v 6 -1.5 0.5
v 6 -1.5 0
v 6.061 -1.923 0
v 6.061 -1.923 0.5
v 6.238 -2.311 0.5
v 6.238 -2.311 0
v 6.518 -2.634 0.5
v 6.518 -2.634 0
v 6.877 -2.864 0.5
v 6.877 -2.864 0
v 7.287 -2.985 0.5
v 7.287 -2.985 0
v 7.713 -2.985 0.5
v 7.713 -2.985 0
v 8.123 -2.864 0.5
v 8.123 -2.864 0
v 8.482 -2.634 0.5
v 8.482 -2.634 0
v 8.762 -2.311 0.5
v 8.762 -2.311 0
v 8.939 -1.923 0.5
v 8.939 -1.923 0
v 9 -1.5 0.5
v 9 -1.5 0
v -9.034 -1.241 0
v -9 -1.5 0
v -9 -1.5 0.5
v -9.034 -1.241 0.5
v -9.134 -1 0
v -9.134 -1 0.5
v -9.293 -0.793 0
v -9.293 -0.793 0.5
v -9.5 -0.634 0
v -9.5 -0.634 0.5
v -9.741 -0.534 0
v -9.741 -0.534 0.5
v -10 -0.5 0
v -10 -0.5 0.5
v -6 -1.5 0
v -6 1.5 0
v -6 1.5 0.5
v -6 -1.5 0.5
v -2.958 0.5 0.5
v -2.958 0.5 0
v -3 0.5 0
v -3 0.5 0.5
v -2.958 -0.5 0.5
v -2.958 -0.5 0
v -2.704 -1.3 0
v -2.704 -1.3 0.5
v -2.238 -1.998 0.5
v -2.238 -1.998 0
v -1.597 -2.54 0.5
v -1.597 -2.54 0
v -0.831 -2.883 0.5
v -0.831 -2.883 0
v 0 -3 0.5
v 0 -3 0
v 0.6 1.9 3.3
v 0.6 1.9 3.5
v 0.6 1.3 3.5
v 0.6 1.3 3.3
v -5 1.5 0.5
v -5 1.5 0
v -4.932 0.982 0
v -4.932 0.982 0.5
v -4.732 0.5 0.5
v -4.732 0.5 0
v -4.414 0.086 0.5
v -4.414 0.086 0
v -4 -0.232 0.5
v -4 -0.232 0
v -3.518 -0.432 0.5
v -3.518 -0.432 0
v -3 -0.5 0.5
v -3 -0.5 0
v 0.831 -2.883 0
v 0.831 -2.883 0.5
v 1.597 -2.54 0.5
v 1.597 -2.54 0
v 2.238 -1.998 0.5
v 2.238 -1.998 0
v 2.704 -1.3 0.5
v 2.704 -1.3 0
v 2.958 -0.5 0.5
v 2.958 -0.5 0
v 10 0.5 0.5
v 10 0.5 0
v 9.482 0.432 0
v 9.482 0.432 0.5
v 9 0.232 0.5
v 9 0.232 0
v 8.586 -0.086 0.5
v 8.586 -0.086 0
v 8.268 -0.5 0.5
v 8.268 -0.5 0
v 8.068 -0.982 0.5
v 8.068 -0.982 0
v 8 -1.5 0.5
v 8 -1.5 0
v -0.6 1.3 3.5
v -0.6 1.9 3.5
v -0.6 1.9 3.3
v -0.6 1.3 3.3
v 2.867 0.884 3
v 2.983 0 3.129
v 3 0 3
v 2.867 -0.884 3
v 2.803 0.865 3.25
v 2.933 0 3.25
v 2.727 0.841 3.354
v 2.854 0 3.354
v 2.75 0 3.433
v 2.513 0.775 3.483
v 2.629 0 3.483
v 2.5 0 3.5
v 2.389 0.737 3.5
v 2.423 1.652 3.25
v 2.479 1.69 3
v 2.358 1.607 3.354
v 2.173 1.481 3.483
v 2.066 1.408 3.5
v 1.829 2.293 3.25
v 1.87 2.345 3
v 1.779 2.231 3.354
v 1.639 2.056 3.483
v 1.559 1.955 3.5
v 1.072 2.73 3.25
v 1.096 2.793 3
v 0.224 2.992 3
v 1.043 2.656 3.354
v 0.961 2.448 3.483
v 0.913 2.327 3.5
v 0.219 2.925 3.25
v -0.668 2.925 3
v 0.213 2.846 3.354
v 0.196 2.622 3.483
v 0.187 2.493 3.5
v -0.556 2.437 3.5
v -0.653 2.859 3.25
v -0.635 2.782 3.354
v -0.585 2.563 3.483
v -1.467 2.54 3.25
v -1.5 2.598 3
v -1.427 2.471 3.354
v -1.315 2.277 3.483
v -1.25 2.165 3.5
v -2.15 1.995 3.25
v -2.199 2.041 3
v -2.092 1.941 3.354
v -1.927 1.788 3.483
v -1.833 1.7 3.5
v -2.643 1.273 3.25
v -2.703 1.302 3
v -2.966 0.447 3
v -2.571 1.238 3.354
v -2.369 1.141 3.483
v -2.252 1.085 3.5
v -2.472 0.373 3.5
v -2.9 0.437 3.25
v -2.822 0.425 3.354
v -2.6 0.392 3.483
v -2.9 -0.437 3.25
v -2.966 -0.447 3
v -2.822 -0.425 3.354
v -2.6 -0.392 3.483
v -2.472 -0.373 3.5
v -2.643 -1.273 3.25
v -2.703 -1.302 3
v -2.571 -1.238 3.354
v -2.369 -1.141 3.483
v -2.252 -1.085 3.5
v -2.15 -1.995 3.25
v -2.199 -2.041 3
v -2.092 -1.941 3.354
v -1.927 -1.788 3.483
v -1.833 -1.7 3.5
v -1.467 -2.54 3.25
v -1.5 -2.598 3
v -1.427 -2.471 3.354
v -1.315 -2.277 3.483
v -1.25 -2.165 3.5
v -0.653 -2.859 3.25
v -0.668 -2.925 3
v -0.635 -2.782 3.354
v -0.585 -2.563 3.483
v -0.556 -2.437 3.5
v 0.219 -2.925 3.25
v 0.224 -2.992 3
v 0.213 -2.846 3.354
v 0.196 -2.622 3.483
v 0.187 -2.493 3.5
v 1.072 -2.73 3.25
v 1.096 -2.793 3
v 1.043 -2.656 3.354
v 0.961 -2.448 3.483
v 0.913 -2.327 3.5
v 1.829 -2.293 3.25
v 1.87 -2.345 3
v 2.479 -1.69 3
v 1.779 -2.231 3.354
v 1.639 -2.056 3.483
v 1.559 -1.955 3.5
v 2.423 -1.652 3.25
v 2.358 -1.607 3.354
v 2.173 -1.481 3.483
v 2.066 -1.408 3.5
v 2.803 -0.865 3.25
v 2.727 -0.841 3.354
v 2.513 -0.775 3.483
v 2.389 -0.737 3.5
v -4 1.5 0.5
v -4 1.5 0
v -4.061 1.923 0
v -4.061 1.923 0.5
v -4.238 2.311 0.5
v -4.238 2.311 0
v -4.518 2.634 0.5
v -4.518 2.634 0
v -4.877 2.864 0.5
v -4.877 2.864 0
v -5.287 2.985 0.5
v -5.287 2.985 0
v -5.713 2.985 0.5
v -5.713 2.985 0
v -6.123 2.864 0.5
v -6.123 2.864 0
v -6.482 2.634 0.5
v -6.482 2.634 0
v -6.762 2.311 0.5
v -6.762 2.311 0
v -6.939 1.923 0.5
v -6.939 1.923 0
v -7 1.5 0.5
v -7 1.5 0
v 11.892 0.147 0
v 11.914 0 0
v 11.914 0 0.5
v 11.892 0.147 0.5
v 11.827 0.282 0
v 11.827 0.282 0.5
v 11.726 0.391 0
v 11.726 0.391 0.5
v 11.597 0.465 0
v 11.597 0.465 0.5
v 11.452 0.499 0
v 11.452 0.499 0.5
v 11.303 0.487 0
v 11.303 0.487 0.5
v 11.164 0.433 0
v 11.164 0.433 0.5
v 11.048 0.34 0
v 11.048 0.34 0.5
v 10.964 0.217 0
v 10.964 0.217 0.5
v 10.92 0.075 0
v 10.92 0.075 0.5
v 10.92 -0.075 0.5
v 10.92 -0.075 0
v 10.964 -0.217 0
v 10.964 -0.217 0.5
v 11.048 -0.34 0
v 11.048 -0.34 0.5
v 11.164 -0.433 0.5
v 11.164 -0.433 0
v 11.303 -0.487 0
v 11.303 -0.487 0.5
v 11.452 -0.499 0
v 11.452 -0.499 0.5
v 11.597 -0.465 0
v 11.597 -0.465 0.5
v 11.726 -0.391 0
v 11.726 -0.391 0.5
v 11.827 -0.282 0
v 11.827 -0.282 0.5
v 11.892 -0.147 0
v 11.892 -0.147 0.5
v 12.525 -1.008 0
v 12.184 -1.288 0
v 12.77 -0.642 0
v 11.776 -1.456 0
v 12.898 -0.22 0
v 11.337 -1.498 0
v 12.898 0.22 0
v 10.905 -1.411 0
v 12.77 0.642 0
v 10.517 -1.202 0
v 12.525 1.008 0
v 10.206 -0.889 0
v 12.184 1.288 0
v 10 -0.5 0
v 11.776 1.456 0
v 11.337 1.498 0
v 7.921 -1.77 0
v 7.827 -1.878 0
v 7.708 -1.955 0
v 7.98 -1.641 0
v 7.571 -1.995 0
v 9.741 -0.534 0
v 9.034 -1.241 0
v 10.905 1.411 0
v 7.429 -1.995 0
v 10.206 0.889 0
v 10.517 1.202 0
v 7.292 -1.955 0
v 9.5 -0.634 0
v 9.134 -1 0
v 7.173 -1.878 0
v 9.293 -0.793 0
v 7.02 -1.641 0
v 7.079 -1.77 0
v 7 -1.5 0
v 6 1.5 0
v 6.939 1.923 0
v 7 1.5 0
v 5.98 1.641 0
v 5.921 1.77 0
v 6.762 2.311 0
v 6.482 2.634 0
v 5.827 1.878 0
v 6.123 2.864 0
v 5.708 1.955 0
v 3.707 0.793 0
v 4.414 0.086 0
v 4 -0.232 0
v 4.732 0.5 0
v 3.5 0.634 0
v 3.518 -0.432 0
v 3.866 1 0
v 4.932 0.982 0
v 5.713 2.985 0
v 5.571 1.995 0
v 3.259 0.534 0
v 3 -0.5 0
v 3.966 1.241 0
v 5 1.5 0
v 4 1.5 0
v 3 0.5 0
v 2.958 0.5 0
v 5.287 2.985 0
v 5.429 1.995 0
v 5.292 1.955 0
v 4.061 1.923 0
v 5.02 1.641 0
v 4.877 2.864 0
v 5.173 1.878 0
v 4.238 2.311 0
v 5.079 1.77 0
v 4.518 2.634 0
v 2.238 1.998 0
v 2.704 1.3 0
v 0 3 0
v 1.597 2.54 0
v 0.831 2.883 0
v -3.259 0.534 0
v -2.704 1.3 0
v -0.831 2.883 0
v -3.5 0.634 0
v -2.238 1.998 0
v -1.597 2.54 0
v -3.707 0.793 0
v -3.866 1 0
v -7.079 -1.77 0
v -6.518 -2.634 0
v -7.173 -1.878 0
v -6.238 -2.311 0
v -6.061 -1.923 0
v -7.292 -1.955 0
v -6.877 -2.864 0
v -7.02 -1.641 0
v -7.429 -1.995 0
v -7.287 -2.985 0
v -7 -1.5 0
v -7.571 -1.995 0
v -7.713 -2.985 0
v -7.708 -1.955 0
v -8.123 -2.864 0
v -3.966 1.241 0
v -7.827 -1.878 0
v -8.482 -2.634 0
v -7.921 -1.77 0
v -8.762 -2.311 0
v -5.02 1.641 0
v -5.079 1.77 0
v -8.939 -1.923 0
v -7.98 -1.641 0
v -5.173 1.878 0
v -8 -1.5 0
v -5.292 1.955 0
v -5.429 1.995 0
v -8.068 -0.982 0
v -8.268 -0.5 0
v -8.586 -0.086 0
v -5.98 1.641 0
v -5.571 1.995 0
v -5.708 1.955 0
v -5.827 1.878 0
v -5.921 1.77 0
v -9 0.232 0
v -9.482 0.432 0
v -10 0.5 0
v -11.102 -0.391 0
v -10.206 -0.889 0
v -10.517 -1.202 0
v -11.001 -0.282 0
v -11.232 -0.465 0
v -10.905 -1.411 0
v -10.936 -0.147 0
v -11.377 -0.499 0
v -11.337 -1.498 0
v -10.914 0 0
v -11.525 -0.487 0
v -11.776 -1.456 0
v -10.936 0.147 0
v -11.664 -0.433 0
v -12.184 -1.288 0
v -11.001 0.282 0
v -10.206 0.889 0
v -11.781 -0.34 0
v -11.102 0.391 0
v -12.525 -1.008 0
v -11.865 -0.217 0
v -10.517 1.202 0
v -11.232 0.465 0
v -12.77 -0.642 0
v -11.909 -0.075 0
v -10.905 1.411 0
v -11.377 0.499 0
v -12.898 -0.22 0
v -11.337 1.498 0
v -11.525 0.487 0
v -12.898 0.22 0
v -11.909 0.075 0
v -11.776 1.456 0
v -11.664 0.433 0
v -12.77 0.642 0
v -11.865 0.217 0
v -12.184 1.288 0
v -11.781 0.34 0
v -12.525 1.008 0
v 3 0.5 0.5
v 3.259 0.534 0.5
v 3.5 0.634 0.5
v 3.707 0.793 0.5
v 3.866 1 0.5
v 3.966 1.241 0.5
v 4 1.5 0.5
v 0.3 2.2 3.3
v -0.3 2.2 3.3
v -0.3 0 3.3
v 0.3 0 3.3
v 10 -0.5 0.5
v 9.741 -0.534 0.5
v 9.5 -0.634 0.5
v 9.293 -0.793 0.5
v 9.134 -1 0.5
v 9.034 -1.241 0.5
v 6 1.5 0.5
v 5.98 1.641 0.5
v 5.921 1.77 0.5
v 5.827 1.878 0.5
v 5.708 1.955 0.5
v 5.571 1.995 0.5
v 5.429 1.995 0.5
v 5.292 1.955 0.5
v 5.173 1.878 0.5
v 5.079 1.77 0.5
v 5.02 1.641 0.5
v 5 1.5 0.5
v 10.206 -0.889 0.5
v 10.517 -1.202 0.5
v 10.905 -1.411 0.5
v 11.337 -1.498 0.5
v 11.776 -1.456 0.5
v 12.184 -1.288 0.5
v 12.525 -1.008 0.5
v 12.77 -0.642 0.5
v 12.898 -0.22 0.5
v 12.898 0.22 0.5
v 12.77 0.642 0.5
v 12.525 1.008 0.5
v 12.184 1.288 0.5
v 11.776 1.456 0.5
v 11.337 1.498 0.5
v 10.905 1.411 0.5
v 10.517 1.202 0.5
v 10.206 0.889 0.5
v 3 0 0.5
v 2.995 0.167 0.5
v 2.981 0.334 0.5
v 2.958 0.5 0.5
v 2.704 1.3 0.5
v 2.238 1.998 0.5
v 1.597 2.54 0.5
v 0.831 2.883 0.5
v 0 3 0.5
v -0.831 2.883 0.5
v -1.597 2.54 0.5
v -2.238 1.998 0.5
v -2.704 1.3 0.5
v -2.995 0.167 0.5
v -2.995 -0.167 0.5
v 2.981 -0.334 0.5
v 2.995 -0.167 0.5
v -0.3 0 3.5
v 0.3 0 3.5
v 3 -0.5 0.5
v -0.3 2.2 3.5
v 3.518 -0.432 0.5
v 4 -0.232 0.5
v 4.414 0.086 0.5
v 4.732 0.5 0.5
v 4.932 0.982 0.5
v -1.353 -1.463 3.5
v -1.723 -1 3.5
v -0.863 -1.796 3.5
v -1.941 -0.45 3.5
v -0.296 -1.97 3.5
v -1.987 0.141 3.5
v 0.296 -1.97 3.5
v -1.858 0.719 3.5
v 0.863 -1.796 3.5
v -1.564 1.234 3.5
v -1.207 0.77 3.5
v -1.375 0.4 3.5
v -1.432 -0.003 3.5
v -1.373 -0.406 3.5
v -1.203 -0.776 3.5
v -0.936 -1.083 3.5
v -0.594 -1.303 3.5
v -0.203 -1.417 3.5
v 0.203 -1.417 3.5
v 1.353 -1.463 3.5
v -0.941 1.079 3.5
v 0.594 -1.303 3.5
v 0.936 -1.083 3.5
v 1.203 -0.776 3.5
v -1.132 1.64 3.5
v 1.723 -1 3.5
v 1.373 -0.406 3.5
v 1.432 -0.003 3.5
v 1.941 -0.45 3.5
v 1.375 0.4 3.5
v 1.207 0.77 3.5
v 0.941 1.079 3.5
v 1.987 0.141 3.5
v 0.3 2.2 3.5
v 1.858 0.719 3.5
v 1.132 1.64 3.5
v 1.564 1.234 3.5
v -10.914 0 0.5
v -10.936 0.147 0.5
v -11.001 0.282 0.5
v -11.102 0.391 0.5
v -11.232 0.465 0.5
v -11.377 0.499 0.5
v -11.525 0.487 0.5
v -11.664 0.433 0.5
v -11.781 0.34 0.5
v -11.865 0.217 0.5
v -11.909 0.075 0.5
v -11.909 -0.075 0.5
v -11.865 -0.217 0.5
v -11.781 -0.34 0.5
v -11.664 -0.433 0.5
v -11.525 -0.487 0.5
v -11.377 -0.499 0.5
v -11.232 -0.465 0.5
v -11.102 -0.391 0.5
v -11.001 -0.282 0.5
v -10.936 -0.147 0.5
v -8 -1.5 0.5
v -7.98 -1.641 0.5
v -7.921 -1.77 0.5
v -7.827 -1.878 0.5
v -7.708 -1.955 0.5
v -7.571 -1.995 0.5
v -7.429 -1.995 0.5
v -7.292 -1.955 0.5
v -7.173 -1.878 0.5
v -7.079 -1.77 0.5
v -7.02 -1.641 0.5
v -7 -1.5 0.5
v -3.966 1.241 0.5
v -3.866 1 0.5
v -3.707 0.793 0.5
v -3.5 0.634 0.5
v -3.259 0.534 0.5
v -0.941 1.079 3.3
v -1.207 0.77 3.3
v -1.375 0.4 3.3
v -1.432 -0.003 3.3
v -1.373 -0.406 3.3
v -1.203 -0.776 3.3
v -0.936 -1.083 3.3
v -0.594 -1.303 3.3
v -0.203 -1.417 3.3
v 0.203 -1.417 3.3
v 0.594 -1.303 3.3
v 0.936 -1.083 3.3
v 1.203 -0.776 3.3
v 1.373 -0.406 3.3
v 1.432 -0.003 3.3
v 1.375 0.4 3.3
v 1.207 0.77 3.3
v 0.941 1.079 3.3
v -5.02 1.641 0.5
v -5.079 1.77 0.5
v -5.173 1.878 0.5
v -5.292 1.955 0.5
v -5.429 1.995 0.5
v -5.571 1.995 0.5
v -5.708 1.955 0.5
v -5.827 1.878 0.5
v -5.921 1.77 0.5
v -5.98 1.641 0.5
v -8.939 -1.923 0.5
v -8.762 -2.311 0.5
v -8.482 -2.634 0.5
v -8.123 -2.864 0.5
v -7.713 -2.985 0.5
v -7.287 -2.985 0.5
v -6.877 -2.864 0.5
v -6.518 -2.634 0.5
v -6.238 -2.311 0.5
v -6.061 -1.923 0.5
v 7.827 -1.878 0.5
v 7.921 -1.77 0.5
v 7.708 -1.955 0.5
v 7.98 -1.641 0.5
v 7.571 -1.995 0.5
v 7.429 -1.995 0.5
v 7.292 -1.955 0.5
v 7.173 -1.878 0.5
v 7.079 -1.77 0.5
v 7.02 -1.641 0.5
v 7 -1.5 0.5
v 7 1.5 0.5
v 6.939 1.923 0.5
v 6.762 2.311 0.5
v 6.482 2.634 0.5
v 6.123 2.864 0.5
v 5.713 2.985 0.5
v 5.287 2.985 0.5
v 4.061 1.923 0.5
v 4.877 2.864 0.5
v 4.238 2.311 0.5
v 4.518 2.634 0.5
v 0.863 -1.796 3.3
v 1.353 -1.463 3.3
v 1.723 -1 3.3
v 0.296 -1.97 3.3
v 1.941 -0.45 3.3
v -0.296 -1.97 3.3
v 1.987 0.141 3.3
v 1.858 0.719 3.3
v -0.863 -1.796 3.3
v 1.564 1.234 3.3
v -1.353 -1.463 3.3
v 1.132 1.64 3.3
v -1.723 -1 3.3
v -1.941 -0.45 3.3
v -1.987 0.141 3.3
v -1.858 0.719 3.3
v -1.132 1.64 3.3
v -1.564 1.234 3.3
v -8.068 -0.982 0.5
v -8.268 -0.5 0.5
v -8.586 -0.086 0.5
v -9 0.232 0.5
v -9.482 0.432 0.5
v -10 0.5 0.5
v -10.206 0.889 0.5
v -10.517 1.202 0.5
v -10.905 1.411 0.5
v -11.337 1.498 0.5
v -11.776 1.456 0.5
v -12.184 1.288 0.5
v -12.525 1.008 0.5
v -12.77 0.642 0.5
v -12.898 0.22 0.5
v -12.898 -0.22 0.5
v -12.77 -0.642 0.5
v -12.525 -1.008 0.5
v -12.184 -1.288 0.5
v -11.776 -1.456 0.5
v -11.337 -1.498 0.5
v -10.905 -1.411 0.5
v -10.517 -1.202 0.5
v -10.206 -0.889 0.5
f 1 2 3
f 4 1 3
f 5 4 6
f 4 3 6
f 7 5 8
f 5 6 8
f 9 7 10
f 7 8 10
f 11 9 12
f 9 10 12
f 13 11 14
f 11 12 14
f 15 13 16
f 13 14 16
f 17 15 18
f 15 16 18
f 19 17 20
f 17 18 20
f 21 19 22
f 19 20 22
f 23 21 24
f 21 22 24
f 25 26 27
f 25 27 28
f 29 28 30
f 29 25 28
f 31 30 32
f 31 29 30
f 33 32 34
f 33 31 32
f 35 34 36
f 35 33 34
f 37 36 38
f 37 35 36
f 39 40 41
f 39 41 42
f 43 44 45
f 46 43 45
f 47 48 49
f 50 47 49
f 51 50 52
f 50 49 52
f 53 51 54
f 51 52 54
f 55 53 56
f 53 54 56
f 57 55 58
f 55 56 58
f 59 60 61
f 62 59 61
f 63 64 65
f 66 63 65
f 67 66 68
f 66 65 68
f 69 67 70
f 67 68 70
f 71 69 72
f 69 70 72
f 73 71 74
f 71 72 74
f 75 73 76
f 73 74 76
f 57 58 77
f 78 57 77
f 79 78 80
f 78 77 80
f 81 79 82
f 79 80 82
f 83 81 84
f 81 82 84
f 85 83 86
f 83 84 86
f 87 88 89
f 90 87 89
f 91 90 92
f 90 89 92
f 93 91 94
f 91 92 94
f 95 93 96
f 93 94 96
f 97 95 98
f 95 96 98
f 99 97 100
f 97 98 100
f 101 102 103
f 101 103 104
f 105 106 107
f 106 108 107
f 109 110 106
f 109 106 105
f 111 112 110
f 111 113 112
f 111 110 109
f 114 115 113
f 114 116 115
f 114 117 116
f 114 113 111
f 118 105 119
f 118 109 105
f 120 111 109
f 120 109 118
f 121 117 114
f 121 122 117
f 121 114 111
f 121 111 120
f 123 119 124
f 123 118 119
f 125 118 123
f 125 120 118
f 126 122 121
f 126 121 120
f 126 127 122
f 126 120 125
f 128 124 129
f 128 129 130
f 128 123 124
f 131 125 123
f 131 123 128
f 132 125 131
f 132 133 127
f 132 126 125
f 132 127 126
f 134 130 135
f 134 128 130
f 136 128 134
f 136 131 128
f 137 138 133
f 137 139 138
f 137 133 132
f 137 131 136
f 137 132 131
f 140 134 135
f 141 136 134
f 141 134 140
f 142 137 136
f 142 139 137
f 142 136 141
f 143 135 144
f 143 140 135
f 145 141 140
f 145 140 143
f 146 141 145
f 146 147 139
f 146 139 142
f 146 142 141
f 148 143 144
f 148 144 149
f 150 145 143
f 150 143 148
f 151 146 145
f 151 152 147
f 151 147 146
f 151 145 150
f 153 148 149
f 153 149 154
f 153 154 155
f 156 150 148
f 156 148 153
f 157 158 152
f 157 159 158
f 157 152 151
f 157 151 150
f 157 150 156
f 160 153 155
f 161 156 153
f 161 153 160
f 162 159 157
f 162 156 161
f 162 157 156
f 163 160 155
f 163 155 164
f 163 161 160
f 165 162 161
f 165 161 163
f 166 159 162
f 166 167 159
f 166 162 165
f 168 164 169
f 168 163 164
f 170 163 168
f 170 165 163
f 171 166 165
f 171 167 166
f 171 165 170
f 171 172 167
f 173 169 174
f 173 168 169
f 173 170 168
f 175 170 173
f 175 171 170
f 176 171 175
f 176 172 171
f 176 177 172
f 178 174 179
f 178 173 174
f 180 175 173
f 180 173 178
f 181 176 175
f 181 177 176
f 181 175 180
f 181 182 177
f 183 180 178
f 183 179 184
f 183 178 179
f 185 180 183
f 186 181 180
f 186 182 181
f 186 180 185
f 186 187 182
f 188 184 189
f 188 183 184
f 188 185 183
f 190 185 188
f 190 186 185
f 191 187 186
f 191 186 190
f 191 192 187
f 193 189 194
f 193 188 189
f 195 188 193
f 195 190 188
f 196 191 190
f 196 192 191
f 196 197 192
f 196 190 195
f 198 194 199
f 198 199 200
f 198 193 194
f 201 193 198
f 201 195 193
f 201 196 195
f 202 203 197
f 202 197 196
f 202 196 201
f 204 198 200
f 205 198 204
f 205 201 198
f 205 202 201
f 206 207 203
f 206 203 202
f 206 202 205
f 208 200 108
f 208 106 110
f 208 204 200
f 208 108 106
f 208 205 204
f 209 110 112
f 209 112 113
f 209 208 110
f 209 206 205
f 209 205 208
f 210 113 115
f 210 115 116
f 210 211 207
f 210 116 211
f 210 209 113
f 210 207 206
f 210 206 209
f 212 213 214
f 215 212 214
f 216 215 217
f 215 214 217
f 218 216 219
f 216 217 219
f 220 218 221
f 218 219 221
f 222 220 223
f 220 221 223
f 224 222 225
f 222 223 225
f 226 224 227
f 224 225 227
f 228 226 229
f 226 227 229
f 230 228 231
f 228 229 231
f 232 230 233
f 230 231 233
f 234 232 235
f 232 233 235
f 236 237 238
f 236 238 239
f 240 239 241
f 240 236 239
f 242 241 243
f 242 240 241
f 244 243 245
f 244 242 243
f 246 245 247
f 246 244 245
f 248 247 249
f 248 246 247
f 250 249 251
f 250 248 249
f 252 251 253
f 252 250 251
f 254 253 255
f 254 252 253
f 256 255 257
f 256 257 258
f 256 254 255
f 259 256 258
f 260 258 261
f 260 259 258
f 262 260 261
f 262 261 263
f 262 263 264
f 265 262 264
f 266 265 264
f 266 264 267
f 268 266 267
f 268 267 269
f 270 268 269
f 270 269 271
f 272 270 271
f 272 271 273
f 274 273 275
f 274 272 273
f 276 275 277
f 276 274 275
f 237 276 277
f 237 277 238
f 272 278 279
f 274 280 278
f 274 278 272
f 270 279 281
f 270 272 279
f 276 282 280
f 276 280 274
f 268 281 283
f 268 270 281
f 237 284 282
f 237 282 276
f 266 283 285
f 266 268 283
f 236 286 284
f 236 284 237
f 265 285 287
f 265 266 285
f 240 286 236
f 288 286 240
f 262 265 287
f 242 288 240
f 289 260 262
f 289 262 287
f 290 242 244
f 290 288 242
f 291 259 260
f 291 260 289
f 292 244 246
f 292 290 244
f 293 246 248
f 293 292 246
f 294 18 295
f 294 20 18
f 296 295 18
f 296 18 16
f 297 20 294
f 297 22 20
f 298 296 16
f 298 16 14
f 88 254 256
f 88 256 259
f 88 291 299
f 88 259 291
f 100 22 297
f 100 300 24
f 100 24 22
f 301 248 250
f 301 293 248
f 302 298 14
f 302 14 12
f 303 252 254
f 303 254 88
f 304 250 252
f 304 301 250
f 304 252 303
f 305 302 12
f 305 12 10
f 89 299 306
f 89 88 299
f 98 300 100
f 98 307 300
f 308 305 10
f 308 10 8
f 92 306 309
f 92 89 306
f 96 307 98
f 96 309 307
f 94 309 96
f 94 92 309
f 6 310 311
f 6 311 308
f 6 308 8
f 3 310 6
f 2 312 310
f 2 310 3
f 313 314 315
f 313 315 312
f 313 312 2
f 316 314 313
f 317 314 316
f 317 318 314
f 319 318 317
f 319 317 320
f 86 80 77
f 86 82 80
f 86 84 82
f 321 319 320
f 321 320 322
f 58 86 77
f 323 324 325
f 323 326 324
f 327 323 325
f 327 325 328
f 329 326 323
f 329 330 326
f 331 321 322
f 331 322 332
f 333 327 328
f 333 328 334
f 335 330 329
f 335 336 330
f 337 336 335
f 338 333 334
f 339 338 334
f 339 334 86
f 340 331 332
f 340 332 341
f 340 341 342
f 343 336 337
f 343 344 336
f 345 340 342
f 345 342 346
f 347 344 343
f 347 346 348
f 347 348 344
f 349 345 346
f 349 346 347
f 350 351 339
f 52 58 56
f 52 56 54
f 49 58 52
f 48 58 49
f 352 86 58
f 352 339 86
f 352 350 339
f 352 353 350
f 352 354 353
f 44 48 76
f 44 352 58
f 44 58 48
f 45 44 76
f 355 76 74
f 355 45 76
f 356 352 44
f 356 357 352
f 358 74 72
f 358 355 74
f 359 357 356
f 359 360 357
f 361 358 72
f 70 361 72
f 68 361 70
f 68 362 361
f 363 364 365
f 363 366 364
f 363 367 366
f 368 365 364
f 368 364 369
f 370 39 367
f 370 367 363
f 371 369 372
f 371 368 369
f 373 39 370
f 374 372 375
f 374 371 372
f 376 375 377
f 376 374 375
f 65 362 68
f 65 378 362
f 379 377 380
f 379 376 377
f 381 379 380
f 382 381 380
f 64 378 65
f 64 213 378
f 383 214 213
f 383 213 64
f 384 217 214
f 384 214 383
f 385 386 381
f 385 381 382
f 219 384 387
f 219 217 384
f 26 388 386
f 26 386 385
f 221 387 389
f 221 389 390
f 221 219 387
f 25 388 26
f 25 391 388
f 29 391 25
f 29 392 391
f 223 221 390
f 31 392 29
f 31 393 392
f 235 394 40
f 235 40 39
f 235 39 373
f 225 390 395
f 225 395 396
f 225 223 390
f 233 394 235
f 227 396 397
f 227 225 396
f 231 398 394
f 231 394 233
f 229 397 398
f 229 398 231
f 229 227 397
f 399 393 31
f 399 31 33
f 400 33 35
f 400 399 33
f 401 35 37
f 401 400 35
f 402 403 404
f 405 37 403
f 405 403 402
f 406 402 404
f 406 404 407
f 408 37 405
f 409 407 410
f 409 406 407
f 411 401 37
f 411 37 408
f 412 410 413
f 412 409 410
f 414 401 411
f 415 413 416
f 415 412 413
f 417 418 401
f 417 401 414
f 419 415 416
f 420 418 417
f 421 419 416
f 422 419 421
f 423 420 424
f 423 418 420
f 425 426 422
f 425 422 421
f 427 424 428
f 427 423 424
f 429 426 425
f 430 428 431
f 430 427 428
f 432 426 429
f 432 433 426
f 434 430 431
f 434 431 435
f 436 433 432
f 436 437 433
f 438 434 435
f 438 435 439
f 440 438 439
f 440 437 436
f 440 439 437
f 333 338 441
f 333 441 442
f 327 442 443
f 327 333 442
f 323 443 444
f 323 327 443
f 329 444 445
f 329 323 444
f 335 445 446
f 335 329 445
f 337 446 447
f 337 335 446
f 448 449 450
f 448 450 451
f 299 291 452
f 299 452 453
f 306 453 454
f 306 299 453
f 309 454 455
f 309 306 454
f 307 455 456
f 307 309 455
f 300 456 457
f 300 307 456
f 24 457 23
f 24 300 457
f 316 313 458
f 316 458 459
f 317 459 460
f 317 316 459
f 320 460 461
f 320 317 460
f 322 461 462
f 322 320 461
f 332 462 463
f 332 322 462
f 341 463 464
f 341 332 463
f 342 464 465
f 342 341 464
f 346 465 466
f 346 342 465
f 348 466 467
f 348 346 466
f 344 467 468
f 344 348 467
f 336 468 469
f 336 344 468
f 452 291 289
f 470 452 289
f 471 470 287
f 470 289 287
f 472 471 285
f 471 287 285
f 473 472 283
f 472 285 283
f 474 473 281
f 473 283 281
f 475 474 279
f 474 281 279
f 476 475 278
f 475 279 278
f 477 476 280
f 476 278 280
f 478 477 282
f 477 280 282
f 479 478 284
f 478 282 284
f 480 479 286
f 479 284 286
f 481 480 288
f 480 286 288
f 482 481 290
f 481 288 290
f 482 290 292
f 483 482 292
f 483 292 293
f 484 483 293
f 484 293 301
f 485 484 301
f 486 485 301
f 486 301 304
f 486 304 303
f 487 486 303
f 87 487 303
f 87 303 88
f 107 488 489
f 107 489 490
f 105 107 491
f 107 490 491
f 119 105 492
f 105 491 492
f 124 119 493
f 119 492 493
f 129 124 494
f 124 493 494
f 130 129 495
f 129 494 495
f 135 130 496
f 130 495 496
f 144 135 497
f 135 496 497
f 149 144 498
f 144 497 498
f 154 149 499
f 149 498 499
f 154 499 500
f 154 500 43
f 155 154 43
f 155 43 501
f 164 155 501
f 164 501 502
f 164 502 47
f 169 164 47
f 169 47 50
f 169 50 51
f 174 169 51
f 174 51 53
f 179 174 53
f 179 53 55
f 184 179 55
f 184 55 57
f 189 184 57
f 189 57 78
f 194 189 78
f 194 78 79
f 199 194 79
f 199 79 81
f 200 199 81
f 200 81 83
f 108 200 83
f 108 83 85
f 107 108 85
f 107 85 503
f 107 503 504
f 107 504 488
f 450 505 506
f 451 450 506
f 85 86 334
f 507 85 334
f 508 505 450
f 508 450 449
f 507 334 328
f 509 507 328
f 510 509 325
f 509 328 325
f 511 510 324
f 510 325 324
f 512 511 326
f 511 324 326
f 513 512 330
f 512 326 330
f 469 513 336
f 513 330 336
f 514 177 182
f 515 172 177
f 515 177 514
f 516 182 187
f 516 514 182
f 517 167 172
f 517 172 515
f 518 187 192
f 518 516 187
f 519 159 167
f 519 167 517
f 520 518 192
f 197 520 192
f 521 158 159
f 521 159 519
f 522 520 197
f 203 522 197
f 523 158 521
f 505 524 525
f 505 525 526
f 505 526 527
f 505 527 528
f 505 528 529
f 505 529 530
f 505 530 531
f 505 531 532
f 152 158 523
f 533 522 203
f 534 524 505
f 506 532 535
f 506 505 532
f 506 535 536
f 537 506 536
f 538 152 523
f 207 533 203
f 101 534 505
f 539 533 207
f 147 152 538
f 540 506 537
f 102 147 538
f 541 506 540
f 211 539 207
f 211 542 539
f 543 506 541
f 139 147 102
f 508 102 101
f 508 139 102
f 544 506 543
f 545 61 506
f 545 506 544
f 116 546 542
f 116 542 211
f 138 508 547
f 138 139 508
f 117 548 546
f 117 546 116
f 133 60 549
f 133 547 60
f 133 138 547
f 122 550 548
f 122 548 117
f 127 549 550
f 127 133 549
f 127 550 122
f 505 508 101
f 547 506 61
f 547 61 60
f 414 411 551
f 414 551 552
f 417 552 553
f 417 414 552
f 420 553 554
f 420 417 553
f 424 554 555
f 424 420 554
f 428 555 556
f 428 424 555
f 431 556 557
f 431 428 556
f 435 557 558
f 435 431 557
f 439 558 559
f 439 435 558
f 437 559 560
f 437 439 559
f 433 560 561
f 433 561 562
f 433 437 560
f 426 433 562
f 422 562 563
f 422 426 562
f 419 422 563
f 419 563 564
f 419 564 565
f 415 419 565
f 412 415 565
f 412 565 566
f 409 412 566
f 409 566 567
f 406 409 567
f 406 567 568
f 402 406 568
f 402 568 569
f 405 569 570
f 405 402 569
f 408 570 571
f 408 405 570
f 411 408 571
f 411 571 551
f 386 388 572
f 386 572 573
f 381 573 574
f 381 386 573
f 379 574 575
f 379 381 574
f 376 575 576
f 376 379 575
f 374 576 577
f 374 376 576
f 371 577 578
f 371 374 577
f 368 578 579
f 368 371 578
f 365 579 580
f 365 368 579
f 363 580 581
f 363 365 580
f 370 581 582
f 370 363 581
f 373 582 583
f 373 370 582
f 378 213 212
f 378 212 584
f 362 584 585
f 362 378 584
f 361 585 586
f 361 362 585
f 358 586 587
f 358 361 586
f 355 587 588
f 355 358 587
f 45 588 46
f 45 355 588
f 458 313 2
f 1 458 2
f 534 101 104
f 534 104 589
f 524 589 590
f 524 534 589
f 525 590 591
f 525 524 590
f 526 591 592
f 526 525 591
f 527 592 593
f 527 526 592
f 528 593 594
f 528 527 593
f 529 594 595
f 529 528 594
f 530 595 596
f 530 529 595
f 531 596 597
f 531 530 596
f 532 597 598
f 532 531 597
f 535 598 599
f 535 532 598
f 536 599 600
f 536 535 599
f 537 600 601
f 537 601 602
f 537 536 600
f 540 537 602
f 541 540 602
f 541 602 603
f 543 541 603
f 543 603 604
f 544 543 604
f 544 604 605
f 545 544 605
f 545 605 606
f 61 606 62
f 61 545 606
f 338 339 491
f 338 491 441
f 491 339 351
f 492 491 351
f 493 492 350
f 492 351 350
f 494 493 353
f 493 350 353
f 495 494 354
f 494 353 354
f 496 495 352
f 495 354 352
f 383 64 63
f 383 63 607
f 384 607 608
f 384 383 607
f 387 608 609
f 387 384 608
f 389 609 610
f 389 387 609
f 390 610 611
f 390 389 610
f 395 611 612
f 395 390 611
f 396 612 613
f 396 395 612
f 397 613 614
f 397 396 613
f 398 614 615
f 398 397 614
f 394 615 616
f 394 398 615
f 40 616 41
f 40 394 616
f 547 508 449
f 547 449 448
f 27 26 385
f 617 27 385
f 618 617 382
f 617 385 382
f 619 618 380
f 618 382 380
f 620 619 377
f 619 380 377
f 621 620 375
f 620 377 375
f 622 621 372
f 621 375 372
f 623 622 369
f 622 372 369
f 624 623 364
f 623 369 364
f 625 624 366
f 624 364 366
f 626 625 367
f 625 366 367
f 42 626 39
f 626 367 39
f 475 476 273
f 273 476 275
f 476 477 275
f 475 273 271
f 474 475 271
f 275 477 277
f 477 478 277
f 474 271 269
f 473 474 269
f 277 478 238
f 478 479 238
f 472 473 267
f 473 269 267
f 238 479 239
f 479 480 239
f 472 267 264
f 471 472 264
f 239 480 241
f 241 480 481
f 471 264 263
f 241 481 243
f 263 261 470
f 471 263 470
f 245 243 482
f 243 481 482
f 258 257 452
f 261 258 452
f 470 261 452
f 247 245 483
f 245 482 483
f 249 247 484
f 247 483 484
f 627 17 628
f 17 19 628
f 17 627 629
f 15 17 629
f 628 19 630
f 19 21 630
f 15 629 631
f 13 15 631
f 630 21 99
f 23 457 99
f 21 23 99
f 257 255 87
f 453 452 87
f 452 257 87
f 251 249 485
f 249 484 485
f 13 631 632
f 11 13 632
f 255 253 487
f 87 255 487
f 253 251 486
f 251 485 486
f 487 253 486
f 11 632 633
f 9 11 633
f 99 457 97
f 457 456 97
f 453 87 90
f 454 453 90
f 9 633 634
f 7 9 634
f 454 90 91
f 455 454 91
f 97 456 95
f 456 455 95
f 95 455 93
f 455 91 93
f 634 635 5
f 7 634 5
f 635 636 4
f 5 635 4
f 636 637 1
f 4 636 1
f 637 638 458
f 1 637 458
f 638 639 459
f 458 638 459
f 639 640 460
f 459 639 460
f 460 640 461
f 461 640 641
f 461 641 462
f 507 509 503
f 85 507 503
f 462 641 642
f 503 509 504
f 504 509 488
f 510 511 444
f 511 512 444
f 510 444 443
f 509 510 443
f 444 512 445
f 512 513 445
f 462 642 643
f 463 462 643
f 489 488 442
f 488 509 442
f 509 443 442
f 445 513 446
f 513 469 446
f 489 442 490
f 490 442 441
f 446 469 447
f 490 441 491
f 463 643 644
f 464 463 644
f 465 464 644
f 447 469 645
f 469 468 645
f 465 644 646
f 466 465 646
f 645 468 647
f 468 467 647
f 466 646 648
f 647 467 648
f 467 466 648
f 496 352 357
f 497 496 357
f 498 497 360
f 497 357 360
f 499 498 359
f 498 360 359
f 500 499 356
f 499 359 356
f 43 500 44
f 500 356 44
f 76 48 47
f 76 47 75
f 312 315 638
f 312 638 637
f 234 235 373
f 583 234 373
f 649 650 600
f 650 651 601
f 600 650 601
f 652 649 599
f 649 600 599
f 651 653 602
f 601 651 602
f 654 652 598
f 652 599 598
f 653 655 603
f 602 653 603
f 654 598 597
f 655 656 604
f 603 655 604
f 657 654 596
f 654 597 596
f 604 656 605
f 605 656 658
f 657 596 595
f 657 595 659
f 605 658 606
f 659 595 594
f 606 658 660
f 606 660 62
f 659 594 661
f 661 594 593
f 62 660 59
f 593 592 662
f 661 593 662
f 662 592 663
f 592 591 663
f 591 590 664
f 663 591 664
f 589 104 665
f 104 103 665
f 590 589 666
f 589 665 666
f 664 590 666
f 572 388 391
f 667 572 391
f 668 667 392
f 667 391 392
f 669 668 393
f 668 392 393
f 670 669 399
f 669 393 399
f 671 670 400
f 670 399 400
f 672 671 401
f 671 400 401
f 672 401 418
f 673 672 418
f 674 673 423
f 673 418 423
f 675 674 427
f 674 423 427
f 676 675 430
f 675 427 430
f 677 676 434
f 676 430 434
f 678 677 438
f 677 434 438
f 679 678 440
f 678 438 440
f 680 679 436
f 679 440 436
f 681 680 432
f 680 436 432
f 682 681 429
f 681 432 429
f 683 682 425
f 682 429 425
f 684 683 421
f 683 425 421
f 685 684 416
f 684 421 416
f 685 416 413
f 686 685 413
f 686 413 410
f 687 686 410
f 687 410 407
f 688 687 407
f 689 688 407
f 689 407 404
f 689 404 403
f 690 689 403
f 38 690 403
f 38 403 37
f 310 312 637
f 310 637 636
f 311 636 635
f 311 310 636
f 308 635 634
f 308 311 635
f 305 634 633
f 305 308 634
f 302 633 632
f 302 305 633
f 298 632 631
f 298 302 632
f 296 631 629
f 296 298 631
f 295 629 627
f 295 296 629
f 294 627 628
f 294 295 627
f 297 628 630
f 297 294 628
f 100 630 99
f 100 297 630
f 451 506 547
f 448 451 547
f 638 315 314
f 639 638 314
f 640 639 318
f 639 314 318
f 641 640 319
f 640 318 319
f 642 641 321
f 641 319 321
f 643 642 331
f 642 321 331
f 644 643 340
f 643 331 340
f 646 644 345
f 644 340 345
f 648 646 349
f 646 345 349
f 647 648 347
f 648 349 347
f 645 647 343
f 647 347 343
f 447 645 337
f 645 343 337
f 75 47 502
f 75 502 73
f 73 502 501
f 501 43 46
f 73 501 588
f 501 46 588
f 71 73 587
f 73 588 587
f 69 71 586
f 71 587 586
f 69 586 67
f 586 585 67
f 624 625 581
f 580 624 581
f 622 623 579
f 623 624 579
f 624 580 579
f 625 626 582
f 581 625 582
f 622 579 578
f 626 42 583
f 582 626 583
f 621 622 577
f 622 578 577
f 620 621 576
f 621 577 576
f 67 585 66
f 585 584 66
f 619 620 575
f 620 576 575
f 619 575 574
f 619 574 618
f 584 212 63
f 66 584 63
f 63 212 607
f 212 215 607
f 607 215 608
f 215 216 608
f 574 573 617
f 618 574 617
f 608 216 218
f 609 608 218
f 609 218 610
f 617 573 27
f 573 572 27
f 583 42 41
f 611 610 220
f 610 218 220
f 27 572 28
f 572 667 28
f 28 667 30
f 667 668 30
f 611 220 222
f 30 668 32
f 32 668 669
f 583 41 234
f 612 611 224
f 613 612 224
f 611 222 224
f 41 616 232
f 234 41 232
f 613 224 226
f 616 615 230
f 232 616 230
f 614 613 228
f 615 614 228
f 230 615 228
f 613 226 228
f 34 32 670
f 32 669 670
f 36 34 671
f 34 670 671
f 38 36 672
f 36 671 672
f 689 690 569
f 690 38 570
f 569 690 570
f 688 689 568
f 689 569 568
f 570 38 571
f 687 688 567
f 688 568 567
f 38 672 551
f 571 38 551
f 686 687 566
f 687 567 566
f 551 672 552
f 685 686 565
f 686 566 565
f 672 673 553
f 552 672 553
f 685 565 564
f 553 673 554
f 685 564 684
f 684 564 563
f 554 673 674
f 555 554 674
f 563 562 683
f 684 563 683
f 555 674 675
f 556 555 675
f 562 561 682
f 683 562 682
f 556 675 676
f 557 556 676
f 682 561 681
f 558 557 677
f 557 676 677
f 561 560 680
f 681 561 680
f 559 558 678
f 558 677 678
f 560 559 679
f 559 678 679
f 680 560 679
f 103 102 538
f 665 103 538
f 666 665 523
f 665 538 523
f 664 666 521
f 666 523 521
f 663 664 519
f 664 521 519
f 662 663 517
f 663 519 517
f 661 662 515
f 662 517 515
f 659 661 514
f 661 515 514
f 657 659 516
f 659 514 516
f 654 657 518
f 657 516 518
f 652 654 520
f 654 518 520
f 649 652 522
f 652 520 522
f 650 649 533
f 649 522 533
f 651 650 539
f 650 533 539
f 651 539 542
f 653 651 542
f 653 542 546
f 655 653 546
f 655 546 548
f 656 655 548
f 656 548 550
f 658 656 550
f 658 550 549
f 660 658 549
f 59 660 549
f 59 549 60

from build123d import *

# Parameters (mm, degrees)
MIRROREDSKETCH_R = 0.5
PAD_DEPTH        = 0.5
SKETCH_R         = 0.5
PAD001_DEPTH     = 0.5
SKETCH001_R      = 3
PAD002_DEPTH     = 3
FILLET_R         = 0.5
SKETCH002_W      = 0.6
SKETCH002_H      = 2.2
POCKET_DEPTH     = 0.2


with BuildPart() as part:
    # MirroredSketch → Pad (new body)
    with BuildSketch(Plane.XY):
        with BuildLine():
            Line((-2.95804, 0.5), (-3, 0.5))
            ThreePointArc((-4, 1.5), (-3.707107, 0.792893), (-3, 0.5))
            ThreePointArc((-4, 1.5), (-5.5, 3), (-7, 1.5))
            Line((-7, 1.5), (-7, -1.5))
            ThreePointArc((-8, -1.5), (-7.5, -2), (-7, -1.5))
            ThreePointArc((-8, -1.5), (-8.585787, -0.085786), (-10, 0.5))
            ThreePointArc((-10, 0.5), (-12.914214, 0), (-10, -0.5))
            ThreePointArc((-9, -1.5), (-9.292893, -0.792893), (-10, -0.5))
            ThreePointArc((-9, -1.5), (-7.5, -3), (-6, -1.5))
            Line((-6, 1.5), (-6, -1.5))
            ThreePointArc((-5, 1.5), (-5.5, 2), (-6, 1.5))
            ThreePointArc((-5, 1.5), (-4.414214, 0.085786), (-3, -0.5))
            Line((-2.95804, -0.5), (-3, -0.5))
            ThreePointArc((-2.95804, -0.5), (-1.936492, -2.291288), (0, -3))
            Line((0, -3), (0, 3))
            ThreePointArc((0, 3), (-1.936492, 2.291288), (-2.95804, 0.5))
        make_face()
        with Locations((-11.414214, 0)):
            Circle(MIRROREDSKETCH_R, mode=Mode.SUBTRACT)
    extrude(amount=PAD_DEPTH)

    # Sketch → Pad001 (join)
    with BuildSketch(Plane.XY):
        with BuildLine():
            Line((2.95804, 0.5), (3, 0.5))
            ThreePointArc((3, 0.5), (3.707107, 0.792893), (4, 1.5))
            ThreePointArc((7, 1.5), (5.5, 3), (4, 1.5))
            Line((7, 1.5), (7, -1.5))
            ThreePointArc((7, -1.5), (7.5, -2), (8, -1.5))
            ThreePointArc((10, 0.5), (8.585787, -0.085786), (8, -1.5))
            ThreePointArc((10, -0.5), (12.914214, 0), (10, 0.5))
            ThreePointArc((10, -0.5), (9.292893, -0.792893), (9, -1.5))
            ThreePointArc((6, -1.5), (7.5, -3), (9, -1.5))
            Line((6, 1.5), (6, -1.5))
            ThreePointArc((6, 1.5), (5.5, 2), (5, 1.5))
            ThreePointArc((3, -0.5), (4.414214, 0.085786), (5, 1.5))
            Line((2.95804, -0.5), (3, -0.5))
            ThreePointArc((0, -3), (1.936492, -2.291288), (2.95804, -0.5))
            Line((0, -3), (0, 3))
            ThreePointArc((2.95804, 0.5), (1.936492, 2.291288), (0, 3))
        make_face()
        with Locations((11.414214, 0)):
            Circle(SKETCH_R, mode=Mode.SUBTRACT)
    extrude(amount=PAD001_DEPTH)

    # Sketch001 (on Face5 of Pad001) → Pad002 (join)
    with BuildSketch(Plane.XY.offset(0.5)):
        Circle(SKETCH001_R)
    extrude(amount=PAD002_DEPTH)

    # Fillet
    fillet_edges = [part.edges().sort_by_distance(p)[0] for p in [
        (-3, 0, 3.5),
    ]]
    fillet(fillet_edges, radius=FILLET_R)

    # Sketch002 (on Face9 of Fillet) → Pocket (cut)
    with BuildSketch(Plane.XY.offset(3.5)):
        with BuildLine():
            ThreePointArc((-0.6, 1.3), (0, -1.431782), (0.6, 1.3))
            Line((0.6, 1.9), (0.6, 1.3))
            ThreePointArc((-0.6, 1.9), (0, -1.992486), (0.6, 1.9))
            Line((-0.6, 1.9), (-0.6, 1.3))
        make_face()
        with Locations((0, 1.1)):
            Rectangle(SKETCH002_W, SKETCH002_H)
    extrude(amount=-POCKET_DEPTH, mode=Mode.SUBTRACT)


solid = part.part
